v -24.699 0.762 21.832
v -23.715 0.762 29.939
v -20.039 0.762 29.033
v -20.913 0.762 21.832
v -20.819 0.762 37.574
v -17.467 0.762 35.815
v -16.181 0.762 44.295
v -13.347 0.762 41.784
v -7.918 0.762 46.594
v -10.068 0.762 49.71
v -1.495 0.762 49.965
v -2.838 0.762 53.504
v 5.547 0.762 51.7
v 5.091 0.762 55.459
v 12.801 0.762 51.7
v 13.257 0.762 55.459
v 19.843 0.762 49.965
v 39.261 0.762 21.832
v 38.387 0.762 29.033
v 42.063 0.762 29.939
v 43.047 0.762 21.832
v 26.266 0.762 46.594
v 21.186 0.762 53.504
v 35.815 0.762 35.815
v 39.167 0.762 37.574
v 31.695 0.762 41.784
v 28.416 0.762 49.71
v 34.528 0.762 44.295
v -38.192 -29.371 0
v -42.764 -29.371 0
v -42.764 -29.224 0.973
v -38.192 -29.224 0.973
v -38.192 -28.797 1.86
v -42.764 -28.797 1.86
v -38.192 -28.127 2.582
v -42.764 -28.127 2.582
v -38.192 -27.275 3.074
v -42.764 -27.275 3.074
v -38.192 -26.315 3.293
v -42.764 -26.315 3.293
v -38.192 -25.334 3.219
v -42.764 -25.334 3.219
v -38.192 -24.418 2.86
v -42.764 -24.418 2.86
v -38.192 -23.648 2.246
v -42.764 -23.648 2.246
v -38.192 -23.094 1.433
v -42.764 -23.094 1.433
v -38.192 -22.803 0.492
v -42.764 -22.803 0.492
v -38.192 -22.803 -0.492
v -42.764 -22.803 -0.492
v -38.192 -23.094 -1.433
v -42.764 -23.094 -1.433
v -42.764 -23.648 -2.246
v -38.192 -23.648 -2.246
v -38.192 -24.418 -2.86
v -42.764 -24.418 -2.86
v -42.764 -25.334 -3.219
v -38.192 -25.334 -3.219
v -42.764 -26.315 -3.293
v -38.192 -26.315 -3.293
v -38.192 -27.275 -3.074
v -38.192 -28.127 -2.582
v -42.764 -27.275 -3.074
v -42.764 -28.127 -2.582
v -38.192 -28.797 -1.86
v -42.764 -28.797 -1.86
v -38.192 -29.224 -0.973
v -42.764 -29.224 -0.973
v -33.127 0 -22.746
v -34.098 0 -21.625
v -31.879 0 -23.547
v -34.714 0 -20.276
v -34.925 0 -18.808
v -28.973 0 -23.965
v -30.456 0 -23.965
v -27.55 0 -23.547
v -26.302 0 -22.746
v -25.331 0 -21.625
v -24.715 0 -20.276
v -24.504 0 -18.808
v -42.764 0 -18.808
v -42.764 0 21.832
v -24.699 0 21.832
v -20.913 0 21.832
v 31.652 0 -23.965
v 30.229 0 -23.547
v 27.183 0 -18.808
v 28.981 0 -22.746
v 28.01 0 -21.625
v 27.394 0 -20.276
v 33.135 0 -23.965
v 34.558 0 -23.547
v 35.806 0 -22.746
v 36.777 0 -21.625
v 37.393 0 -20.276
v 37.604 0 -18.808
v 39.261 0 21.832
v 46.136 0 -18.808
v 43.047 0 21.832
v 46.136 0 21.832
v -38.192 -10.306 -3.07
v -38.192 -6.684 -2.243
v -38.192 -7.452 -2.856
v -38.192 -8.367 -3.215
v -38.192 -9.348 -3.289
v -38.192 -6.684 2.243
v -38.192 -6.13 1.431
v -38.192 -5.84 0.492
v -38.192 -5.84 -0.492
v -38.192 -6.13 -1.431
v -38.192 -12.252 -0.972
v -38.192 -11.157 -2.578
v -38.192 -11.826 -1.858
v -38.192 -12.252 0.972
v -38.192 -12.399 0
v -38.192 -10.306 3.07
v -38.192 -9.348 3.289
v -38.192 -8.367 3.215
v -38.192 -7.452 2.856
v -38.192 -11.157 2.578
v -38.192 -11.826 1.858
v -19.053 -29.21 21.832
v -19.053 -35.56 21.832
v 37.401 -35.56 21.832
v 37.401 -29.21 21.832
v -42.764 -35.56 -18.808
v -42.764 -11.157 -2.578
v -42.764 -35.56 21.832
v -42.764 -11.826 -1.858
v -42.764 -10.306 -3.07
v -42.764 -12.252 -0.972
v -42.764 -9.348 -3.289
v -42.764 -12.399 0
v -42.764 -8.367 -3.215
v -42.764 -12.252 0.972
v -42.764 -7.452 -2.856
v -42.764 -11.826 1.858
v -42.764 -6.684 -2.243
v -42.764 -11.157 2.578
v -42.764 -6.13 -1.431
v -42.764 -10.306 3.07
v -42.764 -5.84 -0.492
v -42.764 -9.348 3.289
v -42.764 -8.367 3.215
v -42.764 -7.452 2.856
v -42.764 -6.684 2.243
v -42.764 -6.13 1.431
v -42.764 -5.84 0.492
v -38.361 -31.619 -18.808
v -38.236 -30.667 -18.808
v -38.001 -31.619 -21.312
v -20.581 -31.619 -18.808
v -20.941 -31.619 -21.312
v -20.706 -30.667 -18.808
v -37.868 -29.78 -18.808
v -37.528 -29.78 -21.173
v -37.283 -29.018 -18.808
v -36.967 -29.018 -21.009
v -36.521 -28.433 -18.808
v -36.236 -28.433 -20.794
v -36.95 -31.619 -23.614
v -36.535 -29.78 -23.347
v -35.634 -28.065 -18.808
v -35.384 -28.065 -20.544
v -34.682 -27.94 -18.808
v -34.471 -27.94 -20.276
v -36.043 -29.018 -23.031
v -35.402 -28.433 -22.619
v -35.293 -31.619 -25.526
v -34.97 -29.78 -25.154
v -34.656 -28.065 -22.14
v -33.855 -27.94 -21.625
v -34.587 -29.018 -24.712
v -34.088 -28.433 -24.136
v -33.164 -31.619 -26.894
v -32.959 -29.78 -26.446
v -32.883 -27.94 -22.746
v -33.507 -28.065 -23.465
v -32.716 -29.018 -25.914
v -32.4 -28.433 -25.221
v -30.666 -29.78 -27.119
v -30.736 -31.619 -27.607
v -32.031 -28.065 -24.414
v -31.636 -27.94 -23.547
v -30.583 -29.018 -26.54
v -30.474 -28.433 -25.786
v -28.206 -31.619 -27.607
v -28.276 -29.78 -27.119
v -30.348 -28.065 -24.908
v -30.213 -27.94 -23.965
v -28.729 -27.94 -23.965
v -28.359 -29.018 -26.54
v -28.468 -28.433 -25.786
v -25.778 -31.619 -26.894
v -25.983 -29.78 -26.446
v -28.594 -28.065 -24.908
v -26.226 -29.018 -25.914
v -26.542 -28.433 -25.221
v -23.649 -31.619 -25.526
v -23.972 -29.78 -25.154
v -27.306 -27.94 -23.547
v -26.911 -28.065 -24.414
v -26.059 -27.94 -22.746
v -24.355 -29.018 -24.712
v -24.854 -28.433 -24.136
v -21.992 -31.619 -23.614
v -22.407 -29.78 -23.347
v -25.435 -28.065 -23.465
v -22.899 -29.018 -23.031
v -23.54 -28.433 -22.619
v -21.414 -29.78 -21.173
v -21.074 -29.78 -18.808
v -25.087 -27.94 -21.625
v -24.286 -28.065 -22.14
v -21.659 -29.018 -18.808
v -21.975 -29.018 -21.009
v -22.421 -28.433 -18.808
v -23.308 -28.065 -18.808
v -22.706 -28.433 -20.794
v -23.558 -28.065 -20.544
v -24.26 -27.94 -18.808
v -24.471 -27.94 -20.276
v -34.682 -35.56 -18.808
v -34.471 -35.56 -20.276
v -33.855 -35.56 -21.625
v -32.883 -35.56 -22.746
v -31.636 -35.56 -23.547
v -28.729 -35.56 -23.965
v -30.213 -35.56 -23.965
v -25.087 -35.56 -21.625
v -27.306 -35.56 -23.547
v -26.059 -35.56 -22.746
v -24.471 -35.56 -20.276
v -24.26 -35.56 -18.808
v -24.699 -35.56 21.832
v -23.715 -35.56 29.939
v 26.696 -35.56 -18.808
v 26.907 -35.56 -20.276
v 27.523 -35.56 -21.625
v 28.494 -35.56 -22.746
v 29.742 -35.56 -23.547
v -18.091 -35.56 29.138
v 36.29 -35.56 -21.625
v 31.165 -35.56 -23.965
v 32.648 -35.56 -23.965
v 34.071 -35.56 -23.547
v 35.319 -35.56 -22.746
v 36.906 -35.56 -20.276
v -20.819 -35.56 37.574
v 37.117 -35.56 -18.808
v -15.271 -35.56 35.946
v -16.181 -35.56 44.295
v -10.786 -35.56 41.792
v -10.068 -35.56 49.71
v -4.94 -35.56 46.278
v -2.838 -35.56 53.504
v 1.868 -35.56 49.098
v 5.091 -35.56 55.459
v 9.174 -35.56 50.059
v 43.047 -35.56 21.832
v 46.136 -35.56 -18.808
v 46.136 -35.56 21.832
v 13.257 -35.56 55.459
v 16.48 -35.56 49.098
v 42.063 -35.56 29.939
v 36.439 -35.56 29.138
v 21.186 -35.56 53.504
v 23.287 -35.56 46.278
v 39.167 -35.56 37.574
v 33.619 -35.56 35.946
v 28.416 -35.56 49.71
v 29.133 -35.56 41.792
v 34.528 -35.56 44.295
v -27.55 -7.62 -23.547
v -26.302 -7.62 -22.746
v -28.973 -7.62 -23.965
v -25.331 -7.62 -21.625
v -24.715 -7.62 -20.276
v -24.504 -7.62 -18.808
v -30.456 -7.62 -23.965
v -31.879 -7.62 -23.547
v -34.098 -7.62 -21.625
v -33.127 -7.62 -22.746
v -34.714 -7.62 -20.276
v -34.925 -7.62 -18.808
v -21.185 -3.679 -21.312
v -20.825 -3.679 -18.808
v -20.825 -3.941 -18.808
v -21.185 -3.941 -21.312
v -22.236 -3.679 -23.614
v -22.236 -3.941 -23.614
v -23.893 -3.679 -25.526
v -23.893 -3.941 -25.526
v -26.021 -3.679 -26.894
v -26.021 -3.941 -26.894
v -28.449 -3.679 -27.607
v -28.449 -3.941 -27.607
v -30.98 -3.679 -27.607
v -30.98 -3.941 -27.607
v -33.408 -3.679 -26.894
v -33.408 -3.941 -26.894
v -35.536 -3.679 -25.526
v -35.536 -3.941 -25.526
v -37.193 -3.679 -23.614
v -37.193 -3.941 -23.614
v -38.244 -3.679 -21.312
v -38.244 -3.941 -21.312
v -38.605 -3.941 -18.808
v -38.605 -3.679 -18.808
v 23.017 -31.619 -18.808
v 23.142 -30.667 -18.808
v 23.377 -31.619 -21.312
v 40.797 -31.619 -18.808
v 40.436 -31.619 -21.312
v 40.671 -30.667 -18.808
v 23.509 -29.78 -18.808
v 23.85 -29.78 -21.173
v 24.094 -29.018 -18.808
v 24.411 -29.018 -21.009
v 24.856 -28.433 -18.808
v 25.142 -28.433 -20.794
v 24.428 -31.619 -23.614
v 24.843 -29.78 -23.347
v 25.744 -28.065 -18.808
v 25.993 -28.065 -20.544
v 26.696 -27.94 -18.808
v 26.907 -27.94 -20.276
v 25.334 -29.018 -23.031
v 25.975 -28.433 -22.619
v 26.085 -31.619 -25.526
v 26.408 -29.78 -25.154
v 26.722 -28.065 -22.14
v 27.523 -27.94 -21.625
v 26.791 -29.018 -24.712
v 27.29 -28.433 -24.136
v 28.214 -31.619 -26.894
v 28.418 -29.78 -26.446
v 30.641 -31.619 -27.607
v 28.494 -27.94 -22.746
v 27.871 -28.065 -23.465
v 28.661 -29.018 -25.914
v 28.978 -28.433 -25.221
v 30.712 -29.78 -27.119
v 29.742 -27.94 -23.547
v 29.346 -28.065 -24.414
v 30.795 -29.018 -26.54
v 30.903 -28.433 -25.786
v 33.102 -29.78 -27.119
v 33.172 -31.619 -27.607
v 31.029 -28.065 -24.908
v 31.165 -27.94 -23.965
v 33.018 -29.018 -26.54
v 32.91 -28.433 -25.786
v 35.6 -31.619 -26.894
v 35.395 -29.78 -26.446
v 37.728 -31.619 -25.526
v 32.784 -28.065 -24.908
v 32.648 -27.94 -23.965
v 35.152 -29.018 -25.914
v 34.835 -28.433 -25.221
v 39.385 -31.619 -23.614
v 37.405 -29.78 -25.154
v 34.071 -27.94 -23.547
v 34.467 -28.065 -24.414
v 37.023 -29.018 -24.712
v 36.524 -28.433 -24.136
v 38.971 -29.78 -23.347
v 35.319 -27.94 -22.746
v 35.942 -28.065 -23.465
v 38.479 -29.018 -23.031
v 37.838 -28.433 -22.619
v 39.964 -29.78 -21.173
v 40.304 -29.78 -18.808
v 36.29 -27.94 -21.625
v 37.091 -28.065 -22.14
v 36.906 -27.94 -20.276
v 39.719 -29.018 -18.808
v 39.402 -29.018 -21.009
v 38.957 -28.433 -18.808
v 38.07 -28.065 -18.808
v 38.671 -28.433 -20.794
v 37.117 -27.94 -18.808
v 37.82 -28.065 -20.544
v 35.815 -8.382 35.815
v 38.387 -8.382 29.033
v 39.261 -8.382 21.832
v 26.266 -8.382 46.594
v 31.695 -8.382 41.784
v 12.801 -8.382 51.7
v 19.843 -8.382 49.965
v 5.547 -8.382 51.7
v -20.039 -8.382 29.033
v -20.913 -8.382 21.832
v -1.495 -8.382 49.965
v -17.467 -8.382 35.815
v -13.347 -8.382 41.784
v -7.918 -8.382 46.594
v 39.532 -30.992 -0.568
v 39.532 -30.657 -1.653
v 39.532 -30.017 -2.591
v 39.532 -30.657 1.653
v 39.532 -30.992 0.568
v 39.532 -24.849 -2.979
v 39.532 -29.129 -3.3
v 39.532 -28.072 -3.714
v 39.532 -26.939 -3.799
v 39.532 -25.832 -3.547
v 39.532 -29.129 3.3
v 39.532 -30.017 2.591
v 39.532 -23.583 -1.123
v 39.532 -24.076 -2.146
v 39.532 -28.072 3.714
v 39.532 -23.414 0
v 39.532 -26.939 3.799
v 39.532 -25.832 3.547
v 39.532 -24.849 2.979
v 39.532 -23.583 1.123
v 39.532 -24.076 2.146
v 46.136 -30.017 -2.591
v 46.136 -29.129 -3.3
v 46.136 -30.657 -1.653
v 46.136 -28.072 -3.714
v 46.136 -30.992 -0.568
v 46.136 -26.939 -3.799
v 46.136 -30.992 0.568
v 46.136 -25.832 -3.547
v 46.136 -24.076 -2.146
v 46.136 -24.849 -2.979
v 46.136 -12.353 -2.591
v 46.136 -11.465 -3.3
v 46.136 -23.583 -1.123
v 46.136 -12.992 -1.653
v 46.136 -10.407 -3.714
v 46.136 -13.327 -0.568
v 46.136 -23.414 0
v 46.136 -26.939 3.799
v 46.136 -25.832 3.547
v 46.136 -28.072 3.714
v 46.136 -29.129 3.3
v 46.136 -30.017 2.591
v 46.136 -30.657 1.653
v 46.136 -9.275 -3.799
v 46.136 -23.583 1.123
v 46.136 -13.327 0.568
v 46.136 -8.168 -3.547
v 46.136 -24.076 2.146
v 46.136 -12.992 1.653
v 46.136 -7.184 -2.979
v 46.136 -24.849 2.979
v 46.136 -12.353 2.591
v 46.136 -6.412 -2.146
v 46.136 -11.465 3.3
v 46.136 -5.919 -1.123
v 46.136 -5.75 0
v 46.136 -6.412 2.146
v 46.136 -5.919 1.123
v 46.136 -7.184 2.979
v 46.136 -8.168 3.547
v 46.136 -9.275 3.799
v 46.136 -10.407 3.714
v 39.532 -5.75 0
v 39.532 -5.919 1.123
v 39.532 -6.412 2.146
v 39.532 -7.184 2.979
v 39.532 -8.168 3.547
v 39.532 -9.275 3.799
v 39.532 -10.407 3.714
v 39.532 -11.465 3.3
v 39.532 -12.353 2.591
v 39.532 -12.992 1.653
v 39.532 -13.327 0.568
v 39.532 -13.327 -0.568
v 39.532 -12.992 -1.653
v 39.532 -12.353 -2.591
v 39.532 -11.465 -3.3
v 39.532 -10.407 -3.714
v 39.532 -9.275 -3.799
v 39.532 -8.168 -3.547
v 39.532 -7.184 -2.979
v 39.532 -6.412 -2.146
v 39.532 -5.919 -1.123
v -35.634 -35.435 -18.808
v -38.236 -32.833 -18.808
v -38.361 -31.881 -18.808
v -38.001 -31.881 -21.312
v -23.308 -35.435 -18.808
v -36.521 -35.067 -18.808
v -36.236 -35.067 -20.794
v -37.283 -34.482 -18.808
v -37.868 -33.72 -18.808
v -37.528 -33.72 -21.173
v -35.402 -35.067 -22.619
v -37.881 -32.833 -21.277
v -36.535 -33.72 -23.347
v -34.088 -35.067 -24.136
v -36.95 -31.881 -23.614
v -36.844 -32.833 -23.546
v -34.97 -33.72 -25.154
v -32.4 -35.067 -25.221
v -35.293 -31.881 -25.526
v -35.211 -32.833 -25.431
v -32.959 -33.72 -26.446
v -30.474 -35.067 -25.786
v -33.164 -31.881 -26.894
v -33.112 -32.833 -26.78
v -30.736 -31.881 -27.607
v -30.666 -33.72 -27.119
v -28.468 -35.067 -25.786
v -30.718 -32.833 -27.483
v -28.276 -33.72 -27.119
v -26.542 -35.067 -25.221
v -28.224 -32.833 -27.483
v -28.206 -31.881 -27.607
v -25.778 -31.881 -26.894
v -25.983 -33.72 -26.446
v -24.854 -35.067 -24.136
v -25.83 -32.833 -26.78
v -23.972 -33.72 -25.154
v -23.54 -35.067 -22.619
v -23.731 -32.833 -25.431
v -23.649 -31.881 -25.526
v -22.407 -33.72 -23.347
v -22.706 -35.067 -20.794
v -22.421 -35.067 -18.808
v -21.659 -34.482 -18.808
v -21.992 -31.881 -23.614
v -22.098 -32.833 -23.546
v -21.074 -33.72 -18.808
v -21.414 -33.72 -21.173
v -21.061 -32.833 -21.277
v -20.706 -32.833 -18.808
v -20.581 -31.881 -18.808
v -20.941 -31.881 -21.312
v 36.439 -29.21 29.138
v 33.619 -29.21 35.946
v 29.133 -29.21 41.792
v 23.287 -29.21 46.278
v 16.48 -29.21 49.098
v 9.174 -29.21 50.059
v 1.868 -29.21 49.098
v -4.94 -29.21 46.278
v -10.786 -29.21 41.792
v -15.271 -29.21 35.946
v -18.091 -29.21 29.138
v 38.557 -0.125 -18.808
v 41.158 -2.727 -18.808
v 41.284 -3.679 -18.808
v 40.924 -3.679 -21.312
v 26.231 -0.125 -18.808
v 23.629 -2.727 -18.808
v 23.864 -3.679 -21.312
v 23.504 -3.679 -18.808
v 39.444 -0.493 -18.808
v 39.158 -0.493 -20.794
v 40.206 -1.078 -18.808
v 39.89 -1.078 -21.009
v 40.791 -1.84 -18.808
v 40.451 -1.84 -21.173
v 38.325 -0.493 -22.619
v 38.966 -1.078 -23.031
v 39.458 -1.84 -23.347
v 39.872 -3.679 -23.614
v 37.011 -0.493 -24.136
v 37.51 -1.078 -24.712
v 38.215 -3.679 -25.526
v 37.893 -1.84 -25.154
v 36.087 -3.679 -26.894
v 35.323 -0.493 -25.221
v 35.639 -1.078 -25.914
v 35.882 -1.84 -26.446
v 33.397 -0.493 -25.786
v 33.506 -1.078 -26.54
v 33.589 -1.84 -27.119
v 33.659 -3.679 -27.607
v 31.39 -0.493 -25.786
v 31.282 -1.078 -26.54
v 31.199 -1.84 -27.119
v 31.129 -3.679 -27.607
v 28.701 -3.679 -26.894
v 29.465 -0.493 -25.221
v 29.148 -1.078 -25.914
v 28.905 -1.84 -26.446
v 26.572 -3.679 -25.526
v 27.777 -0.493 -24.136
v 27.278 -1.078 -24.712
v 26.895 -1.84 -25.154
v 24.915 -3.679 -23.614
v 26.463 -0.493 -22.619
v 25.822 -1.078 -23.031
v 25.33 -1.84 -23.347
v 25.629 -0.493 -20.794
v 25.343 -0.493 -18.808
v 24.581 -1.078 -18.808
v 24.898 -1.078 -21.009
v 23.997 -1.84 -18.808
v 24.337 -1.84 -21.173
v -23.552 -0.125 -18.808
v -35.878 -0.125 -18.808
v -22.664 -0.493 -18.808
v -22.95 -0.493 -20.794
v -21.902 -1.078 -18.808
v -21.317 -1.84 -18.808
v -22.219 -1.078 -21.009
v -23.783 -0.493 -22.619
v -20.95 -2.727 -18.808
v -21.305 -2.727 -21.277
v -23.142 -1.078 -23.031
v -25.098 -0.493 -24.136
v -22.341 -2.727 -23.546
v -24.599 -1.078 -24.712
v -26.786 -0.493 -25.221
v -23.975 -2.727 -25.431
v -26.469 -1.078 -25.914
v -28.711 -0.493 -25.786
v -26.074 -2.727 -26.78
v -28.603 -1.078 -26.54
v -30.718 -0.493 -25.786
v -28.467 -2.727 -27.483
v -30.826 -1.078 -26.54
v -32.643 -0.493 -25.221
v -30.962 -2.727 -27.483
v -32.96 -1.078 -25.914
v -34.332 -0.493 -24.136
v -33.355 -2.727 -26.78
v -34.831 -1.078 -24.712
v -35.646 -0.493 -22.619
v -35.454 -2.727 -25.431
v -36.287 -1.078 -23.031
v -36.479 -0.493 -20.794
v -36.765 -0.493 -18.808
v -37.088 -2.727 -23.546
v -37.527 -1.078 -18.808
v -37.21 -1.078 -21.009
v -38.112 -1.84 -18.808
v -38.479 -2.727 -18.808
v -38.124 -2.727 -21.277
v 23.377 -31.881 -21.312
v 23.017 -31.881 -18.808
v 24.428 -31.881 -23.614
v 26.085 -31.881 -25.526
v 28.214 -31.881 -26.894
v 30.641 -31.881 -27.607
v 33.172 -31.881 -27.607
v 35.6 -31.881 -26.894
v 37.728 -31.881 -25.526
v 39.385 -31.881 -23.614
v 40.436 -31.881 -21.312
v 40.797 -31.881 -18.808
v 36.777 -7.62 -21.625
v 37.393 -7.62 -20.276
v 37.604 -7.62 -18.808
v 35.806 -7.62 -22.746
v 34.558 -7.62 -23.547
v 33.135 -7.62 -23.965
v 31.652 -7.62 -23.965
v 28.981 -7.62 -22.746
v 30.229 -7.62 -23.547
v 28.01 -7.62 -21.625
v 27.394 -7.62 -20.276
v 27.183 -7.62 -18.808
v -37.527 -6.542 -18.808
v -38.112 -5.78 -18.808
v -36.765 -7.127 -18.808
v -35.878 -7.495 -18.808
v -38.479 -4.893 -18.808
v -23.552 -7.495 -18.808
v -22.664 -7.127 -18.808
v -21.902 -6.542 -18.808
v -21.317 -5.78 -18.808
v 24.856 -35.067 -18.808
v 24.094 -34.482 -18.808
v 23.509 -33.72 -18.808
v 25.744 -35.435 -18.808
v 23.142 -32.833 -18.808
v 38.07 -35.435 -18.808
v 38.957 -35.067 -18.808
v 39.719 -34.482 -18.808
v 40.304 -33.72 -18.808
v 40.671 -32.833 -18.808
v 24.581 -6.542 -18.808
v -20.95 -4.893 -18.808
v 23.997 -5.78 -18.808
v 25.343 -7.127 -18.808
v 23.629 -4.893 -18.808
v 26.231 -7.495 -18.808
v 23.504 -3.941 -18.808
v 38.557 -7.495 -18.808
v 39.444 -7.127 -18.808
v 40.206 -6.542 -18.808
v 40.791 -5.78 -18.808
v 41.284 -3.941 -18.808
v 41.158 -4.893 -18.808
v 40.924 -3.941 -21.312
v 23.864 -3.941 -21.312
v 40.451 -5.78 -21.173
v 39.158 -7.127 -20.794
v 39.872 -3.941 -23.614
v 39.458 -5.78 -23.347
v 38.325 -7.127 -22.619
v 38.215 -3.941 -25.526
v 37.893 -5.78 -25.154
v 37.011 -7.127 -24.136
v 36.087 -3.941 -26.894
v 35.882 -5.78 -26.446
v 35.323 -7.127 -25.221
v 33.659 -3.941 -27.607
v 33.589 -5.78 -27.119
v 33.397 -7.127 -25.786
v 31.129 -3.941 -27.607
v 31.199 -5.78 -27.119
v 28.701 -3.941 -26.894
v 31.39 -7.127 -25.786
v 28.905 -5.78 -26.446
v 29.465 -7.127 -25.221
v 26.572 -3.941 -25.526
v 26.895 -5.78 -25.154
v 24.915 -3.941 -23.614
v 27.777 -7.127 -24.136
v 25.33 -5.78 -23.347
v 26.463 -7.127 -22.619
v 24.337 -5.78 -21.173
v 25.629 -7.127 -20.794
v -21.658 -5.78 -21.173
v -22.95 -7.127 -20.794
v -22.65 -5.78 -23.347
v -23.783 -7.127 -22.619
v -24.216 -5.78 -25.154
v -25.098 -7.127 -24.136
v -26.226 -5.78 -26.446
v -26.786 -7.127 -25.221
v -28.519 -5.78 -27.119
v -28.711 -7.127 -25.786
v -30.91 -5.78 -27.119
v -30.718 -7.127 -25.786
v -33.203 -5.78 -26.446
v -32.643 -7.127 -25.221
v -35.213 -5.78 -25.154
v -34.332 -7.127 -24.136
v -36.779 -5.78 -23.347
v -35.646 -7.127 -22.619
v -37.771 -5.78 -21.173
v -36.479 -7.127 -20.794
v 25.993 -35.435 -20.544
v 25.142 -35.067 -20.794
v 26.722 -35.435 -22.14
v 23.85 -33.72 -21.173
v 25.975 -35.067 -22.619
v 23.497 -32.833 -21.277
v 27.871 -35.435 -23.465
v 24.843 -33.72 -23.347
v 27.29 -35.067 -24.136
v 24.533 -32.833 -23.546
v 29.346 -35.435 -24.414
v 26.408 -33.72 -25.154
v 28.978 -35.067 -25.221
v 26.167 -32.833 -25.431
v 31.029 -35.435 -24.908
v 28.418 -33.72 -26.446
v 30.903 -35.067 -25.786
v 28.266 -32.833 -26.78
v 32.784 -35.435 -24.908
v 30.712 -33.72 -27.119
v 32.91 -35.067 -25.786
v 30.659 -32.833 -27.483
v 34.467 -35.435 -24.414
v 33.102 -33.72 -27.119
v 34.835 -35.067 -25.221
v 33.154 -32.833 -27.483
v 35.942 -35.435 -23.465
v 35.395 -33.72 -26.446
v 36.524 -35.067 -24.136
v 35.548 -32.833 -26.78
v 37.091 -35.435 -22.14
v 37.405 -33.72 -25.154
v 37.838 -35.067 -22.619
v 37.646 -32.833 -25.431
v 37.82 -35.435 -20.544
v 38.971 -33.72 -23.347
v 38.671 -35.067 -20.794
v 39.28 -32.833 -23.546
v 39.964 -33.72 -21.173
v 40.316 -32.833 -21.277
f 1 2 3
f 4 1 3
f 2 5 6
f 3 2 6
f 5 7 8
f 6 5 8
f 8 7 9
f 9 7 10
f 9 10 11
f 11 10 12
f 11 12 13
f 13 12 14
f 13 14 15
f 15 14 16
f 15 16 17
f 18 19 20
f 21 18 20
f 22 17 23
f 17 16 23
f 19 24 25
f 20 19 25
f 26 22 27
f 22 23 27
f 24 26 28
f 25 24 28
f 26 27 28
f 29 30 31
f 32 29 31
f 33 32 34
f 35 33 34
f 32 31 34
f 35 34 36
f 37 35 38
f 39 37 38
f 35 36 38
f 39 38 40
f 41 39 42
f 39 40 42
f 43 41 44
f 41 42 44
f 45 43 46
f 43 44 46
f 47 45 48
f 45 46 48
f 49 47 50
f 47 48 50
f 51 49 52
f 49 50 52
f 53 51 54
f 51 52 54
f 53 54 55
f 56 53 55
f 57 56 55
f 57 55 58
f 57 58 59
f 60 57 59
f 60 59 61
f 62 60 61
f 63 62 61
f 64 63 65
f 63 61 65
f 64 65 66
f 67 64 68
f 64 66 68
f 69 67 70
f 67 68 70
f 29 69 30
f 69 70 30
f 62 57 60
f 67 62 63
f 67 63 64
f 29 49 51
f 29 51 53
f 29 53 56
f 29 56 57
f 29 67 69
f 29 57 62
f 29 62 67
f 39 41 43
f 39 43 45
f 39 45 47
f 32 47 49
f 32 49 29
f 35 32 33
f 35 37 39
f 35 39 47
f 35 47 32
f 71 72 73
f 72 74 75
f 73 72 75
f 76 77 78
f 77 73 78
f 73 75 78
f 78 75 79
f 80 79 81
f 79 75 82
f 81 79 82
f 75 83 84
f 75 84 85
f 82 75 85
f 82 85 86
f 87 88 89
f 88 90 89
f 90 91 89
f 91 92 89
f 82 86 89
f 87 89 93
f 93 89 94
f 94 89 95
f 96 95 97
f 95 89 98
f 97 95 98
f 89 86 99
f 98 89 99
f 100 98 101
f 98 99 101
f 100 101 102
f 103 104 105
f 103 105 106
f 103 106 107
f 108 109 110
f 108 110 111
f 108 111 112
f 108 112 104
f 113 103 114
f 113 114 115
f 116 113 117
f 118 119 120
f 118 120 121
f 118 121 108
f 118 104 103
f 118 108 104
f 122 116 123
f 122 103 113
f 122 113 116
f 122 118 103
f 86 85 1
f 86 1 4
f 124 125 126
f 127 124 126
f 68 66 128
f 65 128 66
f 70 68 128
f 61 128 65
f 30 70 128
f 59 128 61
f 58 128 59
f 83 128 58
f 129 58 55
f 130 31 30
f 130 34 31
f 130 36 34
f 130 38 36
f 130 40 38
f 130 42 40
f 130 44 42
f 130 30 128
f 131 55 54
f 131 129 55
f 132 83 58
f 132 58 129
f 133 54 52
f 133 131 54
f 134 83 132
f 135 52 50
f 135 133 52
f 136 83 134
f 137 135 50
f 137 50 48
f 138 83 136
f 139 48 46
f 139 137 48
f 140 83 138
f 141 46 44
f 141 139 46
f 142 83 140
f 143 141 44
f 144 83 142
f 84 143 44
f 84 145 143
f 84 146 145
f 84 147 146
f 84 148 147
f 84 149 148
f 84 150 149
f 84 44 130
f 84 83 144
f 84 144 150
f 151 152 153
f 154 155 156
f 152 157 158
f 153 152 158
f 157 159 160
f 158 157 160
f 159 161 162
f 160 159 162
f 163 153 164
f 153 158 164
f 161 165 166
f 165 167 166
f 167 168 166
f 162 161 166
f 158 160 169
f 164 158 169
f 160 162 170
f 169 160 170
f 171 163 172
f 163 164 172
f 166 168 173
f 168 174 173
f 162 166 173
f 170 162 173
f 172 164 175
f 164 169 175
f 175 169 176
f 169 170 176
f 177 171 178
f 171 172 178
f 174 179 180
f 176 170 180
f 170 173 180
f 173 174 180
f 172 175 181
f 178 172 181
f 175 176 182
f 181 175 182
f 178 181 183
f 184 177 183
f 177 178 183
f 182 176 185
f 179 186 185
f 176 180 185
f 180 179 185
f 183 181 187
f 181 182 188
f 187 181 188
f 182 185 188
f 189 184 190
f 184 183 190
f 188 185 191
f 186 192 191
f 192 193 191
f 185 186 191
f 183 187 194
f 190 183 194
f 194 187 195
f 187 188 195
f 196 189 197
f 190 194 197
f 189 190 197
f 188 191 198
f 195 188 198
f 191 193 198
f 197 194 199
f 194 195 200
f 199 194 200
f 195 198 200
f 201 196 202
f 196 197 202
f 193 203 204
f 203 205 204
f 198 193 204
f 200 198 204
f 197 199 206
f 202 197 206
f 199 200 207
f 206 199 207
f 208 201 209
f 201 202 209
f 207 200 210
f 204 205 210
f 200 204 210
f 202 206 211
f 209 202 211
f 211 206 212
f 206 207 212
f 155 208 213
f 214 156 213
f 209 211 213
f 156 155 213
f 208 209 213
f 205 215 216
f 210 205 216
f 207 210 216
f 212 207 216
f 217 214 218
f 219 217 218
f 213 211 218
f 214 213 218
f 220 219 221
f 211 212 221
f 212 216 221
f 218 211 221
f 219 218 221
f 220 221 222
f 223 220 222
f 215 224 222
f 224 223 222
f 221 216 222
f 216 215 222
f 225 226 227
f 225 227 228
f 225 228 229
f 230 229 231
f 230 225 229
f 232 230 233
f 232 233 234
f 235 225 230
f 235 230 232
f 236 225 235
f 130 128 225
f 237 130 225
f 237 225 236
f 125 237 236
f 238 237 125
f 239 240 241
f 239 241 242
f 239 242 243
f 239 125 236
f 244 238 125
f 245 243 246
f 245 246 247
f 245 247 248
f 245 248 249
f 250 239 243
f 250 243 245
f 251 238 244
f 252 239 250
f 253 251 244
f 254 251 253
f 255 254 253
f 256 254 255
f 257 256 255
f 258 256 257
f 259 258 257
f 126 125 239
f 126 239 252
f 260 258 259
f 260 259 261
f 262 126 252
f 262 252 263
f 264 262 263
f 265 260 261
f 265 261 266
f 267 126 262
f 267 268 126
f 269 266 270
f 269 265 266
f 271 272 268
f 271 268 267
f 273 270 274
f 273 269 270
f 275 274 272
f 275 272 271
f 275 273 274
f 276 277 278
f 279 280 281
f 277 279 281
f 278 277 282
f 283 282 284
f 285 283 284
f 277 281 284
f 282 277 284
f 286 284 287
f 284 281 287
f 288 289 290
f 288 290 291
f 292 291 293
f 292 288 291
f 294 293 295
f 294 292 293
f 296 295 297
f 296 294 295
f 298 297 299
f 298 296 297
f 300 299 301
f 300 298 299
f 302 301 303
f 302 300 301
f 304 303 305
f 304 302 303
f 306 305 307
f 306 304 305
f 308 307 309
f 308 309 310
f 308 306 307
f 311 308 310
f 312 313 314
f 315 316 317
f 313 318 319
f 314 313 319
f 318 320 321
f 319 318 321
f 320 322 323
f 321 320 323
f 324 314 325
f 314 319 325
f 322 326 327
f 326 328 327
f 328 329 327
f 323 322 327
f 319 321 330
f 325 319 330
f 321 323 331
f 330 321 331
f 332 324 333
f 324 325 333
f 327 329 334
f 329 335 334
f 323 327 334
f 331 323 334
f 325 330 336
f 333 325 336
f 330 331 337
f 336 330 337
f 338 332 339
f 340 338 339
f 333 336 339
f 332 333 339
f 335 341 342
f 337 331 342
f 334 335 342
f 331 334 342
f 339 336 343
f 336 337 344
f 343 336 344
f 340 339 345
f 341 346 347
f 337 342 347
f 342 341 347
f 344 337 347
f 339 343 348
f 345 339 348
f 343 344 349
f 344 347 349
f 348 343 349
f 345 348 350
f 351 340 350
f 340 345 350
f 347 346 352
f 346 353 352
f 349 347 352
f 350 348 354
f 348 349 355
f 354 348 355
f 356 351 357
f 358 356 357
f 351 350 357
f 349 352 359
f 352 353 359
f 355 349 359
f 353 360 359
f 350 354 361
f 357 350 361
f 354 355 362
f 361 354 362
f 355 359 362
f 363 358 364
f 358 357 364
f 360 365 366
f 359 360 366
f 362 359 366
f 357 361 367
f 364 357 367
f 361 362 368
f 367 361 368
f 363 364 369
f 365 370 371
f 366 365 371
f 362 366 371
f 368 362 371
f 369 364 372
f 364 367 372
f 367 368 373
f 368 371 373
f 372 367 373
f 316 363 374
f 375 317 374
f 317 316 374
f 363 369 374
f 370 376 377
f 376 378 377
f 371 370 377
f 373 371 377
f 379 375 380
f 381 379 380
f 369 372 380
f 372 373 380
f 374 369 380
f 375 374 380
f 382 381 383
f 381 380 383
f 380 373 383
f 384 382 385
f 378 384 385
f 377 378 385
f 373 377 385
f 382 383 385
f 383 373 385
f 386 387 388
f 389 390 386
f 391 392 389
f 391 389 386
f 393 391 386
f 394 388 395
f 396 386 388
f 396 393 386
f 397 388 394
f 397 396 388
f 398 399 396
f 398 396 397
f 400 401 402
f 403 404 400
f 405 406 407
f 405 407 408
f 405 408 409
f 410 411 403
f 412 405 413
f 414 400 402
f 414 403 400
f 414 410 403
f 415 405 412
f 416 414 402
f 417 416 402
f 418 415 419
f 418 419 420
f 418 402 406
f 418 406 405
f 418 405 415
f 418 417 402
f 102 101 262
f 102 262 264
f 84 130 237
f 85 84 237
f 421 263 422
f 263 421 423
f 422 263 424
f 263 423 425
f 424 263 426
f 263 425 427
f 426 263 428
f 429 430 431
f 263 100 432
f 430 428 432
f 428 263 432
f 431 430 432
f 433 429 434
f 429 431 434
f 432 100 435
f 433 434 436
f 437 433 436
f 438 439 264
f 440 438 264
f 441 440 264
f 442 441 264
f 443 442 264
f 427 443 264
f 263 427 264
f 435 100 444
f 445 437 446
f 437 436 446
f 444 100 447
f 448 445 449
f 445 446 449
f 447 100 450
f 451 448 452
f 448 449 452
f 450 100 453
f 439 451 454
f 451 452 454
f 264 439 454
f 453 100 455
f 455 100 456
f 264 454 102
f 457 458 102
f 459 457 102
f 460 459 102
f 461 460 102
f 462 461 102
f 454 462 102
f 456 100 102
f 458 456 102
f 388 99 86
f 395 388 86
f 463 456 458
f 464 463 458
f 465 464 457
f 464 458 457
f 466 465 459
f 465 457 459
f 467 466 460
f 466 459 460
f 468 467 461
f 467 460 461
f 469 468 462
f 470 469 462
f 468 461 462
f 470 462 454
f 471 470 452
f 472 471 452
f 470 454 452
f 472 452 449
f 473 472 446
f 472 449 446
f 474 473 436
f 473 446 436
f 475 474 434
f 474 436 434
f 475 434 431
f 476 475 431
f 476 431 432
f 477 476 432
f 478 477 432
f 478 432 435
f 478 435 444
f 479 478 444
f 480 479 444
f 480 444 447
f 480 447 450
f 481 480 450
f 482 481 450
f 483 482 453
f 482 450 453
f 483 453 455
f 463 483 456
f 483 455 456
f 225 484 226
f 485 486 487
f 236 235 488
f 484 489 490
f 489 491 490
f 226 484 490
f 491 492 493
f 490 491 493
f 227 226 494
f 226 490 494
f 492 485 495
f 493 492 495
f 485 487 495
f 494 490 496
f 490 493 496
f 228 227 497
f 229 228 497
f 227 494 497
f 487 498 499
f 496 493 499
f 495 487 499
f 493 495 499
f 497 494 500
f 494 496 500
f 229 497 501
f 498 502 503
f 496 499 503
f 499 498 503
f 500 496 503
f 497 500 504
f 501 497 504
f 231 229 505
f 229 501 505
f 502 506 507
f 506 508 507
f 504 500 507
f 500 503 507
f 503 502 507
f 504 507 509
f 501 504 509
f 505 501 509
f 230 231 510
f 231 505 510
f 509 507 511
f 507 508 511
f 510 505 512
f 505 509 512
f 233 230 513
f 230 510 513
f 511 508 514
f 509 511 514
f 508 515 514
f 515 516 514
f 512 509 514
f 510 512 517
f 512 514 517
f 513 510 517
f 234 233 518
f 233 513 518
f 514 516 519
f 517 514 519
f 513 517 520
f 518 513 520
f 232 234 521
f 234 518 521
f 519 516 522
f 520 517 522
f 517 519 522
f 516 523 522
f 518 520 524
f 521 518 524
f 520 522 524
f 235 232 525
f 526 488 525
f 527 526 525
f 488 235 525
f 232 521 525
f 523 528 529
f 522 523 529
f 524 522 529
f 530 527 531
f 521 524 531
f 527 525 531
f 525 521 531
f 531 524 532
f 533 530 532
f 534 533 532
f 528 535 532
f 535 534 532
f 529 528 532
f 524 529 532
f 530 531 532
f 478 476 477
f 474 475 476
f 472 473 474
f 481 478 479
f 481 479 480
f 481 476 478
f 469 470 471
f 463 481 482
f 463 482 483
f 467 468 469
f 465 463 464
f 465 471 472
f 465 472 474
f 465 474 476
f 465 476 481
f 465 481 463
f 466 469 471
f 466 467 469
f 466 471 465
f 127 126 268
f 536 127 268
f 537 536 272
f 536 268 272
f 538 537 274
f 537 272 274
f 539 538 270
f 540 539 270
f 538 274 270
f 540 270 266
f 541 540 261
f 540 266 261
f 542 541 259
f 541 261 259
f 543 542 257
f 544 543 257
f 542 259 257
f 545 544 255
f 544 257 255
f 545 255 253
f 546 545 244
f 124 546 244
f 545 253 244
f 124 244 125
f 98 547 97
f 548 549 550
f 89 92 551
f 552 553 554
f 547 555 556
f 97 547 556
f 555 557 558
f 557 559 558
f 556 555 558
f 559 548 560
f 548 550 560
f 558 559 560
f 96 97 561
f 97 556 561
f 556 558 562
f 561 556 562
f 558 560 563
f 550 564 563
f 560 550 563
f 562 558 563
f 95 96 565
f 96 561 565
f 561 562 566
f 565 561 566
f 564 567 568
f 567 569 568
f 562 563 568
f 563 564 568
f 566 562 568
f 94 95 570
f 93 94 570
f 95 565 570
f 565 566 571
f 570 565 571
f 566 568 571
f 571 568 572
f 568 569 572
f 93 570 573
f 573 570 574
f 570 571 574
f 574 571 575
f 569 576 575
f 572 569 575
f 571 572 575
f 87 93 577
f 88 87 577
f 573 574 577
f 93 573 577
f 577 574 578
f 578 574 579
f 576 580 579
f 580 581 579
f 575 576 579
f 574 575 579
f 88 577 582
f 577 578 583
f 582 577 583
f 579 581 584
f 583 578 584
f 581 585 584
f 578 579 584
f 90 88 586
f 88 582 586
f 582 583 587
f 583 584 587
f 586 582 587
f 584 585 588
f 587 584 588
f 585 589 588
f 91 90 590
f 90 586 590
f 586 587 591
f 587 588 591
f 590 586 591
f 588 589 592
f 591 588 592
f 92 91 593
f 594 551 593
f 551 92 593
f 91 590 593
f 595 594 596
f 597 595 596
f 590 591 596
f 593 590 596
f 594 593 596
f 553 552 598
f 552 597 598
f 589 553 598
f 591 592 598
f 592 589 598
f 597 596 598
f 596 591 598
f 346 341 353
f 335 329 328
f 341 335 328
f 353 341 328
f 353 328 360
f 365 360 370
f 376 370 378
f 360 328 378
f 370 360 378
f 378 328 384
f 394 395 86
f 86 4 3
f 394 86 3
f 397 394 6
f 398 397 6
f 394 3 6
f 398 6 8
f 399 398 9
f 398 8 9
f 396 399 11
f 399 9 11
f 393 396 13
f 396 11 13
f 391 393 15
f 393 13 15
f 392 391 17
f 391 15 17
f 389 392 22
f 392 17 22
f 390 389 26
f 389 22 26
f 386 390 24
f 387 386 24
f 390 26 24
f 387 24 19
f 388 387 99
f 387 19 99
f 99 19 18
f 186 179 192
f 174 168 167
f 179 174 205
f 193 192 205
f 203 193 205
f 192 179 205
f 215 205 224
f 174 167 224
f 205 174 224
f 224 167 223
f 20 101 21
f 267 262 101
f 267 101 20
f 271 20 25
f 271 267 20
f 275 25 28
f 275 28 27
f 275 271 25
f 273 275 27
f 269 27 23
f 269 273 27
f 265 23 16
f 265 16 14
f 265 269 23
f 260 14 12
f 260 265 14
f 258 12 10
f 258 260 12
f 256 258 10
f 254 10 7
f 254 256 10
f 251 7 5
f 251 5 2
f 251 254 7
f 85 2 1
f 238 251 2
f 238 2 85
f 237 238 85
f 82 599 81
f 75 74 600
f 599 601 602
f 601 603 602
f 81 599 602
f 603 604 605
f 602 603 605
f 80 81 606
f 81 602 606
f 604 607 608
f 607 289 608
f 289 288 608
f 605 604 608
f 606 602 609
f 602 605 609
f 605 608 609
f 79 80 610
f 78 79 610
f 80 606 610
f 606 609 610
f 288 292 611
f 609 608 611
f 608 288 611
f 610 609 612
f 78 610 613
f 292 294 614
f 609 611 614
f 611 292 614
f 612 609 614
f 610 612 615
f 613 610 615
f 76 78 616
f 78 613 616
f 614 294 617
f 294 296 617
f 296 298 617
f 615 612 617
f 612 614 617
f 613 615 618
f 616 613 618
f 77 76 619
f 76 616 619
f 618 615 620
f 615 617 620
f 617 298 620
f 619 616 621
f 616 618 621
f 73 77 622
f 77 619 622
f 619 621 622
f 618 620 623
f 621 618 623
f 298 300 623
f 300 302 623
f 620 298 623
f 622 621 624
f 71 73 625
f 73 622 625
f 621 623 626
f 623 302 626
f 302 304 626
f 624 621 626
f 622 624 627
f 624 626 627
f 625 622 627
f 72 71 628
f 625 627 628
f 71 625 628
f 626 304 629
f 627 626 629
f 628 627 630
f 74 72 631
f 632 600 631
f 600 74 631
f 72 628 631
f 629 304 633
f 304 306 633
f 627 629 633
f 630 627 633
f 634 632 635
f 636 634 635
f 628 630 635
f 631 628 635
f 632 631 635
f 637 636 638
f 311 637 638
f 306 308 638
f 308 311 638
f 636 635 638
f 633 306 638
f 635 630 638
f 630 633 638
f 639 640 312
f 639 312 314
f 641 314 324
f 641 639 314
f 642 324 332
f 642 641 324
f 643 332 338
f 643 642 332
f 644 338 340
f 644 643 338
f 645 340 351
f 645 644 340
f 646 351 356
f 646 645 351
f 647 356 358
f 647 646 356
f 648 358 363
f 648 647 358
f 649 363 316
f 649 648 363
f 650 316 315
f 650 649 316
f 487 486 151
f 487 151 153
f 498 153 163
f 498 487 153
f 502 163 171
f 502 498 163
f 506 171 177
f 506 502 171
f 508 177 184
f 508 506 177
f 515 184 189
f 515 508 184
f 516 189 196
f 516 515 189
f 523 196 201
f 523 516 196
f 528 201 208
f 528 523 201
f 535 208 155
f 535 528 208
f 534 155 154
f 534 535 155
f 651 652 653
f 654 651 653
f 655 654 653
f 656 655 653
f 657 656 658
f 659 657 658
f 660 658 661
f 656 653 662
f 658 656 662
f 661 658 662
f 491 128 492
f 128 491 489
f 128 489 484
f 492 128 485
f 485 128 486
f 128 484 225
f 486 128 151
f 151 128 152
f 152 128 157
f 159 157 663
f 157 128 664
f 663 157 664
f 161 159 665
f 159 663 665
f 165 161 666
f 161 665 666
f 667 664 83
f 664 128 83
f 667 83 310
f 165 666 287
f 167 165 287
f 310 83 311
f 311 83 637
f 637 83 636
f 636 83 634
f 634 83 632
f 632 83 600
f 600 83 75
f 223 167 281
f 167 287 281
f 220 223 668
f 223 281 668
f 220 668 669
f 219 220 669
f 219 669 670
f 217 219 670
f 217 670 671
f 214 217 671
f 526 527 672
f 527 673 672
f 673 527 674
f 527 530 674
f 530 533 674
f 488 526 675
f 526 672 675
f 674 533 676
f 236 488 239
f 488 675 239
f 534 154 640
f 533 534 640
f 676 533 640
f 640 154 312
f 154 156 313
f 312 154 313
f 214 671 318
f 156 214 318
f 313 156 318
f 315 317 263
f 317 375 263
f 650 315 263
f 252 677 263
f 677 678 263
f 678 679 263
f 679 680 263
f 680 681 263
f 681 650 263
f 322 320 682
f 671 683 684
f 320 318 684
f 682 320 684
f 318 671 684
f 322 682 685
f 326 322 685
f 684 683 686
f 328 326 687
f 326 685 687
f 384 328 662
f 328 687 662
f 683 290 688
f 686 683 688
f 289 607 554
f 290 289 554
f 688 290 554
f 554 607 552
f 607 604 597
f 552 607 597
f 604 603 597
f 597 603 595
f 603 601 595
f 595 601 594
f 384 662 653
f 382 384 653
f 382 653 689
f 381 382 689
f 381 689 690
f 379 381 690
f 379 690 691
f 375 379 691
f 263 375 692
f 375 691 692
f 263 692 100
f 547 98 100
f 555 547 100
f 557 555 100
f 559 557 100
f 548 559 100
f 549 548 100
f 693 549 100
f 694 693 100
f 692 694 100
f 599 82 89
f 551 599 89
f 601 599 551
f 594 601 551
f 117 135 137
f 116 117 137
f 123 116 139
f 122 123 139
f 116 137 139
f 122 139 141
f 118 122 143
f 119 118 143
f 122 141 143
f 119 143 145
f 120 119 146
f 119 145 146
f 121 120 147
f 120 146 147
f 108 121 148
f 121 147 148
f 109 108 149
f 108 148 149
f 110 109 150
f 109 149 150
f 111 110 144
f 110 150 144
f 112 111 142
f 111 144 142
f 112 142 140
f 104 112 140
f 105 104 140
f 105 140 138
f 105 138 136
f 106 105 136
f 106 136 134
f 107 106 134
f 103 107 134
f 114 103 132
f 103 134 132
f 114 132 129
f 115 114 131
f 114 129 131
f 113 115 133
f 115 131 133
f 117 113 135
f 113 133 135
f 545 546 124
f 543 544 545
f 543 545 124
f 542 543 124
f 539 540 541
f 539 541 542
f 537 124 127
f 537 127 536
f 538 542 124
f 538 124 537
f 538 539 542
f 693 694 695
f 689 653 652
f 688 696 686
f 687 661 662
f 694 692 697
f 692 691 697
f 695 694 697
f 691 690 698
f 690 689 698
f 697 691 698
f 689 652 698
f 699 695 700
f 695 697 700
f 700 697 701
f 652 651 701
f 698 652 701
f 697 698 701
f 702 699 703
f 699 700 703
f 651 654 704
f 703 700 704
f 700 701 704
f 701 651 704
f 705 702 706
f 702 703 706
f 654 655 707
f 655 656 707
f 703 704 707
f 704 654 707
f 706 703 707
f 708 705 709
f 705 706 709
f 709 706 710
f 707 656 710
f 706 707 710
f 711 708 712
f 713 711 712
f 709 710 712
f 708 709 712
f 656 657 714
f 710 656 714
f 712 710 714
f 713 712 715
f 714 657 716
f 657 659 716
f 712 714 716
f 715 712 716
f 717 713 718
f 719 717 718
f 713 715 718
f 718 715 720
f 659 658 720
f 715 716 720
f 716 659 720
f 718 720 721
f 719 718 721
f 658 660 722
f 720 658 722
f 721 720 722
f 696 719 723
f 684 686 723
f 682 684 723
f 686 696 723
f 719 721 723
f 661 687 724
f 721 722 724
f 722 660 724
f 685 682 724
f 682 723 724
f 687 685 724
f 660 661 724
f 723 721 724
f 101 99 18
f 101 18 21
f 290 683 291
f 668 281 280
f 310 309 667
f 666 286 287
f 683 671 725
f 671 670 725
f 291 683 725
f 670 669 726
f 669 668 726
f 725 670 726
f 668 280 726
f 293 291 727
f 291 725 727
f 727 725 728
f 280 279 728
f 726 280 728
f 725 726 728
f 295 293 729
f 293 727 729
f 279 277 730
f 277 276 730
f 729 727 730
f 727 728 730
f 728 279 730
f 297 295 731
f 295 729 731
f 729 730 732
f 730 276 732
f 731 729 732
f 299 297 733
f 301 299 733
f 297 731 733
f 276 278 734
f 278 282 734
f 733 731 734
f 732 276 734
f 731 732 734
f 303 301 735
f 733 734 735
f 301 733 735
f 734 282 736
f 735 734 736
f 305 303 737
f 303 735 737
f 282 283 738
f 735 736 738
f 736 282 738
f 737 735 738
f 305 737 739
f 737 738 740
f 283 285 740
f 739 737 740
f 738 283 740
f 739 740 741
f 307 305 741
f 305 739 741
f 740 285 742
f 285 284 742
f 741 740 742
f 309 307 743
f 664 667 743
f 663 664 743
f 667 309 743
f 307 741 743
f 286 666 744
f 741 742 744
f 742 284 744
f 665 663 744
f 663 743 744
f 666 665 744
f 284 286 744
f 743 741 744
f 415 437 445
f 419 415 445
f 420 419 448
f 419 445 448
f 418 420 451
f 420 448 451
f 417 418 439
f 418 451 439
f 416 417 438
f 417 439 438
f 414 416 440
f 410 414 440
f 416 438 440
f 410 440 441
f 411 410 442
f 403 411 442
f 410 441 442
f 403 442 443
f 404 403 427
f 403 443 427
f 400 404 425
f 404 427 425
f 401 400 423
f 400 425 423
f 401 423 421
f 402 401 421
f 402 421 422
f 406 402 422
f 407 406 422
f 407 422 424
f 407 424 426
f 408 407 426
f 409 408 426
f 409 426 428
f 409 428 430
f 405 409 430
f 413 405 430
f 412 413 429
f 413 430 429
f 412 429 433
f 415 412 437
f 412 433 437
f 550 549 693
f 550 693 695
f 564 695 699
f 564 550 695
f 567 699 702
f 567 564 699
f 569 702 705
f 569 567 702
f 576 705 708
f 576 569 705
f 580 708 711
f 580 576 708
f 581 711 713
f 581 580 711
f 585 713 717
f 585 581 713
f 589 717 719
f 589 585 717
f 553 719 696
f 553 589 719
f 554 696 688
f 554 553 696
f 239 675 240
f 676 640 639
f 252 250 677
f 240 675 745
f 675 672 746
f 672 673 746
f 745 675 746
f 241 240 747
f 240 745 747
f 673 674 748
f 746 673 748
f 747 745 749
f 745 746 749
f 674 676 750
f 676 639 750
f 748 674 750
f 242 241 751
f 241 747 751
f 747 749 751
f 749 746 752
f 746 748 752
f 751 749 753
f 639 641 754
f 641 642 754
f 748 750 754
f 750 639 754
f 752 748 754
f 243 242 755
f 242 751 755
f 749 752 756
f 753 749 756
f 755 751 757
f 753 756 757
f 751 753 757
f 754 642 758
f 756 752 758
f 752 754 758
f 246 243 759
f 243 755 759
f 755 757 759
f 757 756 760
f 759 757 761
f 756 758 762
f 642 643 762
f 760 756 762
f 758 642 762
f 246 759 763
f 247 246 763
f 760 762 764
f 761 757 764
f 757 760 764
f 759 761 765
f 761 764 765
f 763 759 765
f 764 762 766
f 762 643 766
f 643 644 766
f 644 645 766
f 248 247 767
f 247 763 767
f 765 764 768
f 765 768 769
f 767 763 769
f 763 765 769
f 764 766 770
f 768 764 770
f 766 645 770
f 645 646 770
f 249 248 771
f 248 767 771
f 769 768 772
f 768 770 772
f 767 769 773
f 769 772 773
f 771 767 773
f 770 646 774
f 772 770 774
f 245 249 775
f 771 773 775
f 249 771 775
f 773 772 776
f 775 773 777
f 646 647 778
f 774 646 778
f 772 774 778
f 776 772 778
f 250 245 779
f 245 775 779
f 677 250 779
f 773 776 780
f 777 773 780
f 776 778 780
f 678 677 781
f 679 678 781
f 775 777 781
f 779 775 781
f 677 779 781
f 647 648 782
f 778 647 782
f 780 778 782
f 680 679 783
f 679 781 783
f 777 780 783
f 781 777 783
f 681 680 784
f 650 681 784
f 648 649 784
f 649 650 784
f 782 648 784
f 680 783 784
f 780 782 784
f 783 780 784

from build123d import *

# Parameters (mm, degrees)
F0_W      = 88.9
F0_H      = 40.64
F1_DEPTH  = 35.56
F3_DEPTH  = 7.62
F5_DEPTH  = 7.62
F7_DEPTH  = 36.322
F9_DEPTH  = 9.906
F11_DEPTH = 6.35
F13_DEPTH = 9.144
F14_R     = 3.81
F15_DEPTH = 6.604
F16_R     = 3.297802
F16_R_2   = 3.302
F17_DEPTH = 4.572
F18_R     = 3.679261


with BuildPart() as f1:
    # F0 (on Front) → F1 (new body)
    with BuildSketch(Plane.XZ):
        with Locations((1.685638, 1.512455)):
            Rectangle(F0_W, F0_H)
    extrude(amount=F1_DEPTH)

    # F2 (on face) → F3 (join)
    with BuildSketch(Plane.XZ.offset(35.56)):
        with BuildLine():
            Line((-20.58096, -18.807545), (-38.36096, -18.807545))
            ThreePointArc((-38.36096, -18.807545), (-29.47096, -27.697545), (-20.58096, -18.807545))
        make_face()
        with BuildLine():
            Line((40.796571, -18.807545), (23.016571, -18.807545))
            ThreePointArc((23.016571, -18.807545), (31.906571, -27.697545), (40.796571, -18.807545))
        make_face()
    extrude(amount=-F3_DEPTH)

    # F4 (on face) → F5 (join)
    with BuildSketch(Plane(origin=(0, 0, 0), x_dir=(-1, 0, 0), z_dir=(0, 1, 0))):
        with BuildLine():
            Line((-23.503698, -18.807545), (-41.283698, -18.807545))
            ThreePointArc((-41.283698, -18.807545), (-32.393698, -27.697545), (-23.503698, -18.807545))
        make_face()
        with BuildLine():
            Line((38.604519, -18.807545), (20.824519, -18.807545))
            ThreePointArc((20.824519, -18.807545), (29.714519, -27.697545), (38.604519, -18.807545))
        make_face()
    extrude(amount=-F5_DEPTH)

    # F6 (on face) → F7 (join)
    with BuildSketch(Plane.XZ.offset(35.56)):
        with BuildLine():
            Line((-24.699327, 21.832455), (43.047176, 21.832455))
            ThreePointArc((43.047176, 21.832455), (9.173924, 55.705706), (-24.699327, 21.832455))
        make_face()
    extrude(amount=-F7_DEPTH)

    # F8 (on face) → F9 (join)
    with BuildSketch(Plane.XZ.offset(35.56)):
        with BuildLine():
            Line((-18.899895, 24.207648), (34.604043, 24.207648))
            ThreePointArc((34.604043, 24.207648), (7.852074, 50.959617), (-18.899895, 24.207648))
        make_face()
    extrude(amount=-F9_DEPTH)

    # F10 (on face) → F11 (cut)
    with BuildSketch(Plane.XZ.offset(35.56)):
        with BuildLine():
            Line((-19.053006, 21.832455), (37.400854, 21.832455))
            ThreePointArc((37.400854, 21.832455), (9.173924, 50.059384), (-19.053006, 21.832455))
        make_face()
    extrude(amount=-F11_DEPTH, mode=Mode.SUBTRACT)

    # F12 (on face) → F13 (cut)
    with BuildSketch(Plane(origin=(0, 0.762, 0), x_dir=(-1, 0, 0), z_dir=(0, 1, 0))):
        with BuildLine():
            Line((-39.26131, 21.832455), (20.913462, 21.832455))
            ThreePointArc((20.913462, 21.832455), (-9.173924, 51.919841), (-39.26131, 21.832455))
        make_face()
    extrude(amount=-F13_DEPTH, mode=Mode.SUBTRACT)

    # F14 (on face) → F15 (cut)
    with BuildSketch(Plane.YZ.offset(46.135638)):
        with Locations((-27.224183, 0)):
            Circle(F14_R)
        with Locations((-9.559637, 0)):
            Circle(F14_R)
    extrude(amount=-F15_DEPTH, mode=Mode.SUBTRACT)

    # F16 (on face) → F17 (cut)
    with BuildSketch(Plane(origin=(-42.764362, 0, 0), x_dir=(0, -1, 0), z_dir=(-1, 0, 0))):
        with Locations((9.101178, 0)):
            Circle(F16_R)
        with Locations((26.068604, 0)):
            Circle(F16_R_2)
    extrude(amount=-F17_DEPTH, mode=Mode.SUBTRACT)

    # F18
    f18_edges = [f1.edges().sort_by_distance(p)[0] for p in [
        (-29.47096, -35.56, -27.697545),
        (-29.714519, -7.62, -27.697545),
        (-29.714519, 0, -27.697545),
        (32.393698, 0, -27.697545),
        (31.906571, -27.94, -27.697545),
        (32.393698, -7.62, -27.697545),
        (-29.47096, -27.94, -27.697545),
        (31.906571, -35.56, -27.697545),
    ]]
    fillet(f18_edges, radius=F18_R)


solid = f1.part
